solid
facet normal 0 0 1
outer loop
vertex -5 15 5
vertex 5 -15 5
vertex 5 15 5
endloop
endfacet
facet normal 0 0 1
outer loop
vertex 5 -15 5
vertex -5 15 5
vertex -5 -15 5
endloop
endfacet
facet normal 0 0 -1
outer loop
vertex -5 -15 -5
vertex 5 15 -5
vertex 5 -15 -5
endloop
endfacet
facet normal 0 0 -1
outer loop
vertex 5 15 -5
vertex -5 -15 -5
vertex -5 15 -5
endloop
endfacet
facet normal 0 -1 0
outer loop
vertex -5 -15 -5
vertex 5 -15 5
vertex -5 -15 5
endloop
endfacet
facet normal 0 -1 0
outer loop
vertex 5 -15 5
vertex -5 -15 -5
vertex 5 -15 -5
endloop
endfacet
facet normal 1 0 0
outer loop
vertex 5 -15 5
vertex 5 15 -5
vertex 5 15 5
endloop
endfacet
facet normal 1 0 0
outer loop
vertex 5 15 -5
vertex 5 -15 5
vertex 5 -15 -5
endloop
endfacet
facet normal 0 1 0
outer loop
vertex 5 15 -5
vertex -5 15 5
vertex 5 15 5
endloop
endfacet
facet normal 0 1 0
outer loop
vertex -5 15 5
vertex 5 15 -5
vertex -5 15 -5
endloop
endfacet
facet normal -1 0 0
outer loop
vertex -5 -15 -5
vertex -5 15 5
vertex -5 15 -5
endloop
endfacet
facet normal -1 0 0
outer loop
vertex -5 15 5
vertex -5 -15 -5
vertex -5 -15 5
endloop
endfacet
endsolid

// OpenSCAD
// Generated by generate_scads.py
scale([2.0,1.5,2.0]) {
  cube(size=[5,20,5], center=true);
}
